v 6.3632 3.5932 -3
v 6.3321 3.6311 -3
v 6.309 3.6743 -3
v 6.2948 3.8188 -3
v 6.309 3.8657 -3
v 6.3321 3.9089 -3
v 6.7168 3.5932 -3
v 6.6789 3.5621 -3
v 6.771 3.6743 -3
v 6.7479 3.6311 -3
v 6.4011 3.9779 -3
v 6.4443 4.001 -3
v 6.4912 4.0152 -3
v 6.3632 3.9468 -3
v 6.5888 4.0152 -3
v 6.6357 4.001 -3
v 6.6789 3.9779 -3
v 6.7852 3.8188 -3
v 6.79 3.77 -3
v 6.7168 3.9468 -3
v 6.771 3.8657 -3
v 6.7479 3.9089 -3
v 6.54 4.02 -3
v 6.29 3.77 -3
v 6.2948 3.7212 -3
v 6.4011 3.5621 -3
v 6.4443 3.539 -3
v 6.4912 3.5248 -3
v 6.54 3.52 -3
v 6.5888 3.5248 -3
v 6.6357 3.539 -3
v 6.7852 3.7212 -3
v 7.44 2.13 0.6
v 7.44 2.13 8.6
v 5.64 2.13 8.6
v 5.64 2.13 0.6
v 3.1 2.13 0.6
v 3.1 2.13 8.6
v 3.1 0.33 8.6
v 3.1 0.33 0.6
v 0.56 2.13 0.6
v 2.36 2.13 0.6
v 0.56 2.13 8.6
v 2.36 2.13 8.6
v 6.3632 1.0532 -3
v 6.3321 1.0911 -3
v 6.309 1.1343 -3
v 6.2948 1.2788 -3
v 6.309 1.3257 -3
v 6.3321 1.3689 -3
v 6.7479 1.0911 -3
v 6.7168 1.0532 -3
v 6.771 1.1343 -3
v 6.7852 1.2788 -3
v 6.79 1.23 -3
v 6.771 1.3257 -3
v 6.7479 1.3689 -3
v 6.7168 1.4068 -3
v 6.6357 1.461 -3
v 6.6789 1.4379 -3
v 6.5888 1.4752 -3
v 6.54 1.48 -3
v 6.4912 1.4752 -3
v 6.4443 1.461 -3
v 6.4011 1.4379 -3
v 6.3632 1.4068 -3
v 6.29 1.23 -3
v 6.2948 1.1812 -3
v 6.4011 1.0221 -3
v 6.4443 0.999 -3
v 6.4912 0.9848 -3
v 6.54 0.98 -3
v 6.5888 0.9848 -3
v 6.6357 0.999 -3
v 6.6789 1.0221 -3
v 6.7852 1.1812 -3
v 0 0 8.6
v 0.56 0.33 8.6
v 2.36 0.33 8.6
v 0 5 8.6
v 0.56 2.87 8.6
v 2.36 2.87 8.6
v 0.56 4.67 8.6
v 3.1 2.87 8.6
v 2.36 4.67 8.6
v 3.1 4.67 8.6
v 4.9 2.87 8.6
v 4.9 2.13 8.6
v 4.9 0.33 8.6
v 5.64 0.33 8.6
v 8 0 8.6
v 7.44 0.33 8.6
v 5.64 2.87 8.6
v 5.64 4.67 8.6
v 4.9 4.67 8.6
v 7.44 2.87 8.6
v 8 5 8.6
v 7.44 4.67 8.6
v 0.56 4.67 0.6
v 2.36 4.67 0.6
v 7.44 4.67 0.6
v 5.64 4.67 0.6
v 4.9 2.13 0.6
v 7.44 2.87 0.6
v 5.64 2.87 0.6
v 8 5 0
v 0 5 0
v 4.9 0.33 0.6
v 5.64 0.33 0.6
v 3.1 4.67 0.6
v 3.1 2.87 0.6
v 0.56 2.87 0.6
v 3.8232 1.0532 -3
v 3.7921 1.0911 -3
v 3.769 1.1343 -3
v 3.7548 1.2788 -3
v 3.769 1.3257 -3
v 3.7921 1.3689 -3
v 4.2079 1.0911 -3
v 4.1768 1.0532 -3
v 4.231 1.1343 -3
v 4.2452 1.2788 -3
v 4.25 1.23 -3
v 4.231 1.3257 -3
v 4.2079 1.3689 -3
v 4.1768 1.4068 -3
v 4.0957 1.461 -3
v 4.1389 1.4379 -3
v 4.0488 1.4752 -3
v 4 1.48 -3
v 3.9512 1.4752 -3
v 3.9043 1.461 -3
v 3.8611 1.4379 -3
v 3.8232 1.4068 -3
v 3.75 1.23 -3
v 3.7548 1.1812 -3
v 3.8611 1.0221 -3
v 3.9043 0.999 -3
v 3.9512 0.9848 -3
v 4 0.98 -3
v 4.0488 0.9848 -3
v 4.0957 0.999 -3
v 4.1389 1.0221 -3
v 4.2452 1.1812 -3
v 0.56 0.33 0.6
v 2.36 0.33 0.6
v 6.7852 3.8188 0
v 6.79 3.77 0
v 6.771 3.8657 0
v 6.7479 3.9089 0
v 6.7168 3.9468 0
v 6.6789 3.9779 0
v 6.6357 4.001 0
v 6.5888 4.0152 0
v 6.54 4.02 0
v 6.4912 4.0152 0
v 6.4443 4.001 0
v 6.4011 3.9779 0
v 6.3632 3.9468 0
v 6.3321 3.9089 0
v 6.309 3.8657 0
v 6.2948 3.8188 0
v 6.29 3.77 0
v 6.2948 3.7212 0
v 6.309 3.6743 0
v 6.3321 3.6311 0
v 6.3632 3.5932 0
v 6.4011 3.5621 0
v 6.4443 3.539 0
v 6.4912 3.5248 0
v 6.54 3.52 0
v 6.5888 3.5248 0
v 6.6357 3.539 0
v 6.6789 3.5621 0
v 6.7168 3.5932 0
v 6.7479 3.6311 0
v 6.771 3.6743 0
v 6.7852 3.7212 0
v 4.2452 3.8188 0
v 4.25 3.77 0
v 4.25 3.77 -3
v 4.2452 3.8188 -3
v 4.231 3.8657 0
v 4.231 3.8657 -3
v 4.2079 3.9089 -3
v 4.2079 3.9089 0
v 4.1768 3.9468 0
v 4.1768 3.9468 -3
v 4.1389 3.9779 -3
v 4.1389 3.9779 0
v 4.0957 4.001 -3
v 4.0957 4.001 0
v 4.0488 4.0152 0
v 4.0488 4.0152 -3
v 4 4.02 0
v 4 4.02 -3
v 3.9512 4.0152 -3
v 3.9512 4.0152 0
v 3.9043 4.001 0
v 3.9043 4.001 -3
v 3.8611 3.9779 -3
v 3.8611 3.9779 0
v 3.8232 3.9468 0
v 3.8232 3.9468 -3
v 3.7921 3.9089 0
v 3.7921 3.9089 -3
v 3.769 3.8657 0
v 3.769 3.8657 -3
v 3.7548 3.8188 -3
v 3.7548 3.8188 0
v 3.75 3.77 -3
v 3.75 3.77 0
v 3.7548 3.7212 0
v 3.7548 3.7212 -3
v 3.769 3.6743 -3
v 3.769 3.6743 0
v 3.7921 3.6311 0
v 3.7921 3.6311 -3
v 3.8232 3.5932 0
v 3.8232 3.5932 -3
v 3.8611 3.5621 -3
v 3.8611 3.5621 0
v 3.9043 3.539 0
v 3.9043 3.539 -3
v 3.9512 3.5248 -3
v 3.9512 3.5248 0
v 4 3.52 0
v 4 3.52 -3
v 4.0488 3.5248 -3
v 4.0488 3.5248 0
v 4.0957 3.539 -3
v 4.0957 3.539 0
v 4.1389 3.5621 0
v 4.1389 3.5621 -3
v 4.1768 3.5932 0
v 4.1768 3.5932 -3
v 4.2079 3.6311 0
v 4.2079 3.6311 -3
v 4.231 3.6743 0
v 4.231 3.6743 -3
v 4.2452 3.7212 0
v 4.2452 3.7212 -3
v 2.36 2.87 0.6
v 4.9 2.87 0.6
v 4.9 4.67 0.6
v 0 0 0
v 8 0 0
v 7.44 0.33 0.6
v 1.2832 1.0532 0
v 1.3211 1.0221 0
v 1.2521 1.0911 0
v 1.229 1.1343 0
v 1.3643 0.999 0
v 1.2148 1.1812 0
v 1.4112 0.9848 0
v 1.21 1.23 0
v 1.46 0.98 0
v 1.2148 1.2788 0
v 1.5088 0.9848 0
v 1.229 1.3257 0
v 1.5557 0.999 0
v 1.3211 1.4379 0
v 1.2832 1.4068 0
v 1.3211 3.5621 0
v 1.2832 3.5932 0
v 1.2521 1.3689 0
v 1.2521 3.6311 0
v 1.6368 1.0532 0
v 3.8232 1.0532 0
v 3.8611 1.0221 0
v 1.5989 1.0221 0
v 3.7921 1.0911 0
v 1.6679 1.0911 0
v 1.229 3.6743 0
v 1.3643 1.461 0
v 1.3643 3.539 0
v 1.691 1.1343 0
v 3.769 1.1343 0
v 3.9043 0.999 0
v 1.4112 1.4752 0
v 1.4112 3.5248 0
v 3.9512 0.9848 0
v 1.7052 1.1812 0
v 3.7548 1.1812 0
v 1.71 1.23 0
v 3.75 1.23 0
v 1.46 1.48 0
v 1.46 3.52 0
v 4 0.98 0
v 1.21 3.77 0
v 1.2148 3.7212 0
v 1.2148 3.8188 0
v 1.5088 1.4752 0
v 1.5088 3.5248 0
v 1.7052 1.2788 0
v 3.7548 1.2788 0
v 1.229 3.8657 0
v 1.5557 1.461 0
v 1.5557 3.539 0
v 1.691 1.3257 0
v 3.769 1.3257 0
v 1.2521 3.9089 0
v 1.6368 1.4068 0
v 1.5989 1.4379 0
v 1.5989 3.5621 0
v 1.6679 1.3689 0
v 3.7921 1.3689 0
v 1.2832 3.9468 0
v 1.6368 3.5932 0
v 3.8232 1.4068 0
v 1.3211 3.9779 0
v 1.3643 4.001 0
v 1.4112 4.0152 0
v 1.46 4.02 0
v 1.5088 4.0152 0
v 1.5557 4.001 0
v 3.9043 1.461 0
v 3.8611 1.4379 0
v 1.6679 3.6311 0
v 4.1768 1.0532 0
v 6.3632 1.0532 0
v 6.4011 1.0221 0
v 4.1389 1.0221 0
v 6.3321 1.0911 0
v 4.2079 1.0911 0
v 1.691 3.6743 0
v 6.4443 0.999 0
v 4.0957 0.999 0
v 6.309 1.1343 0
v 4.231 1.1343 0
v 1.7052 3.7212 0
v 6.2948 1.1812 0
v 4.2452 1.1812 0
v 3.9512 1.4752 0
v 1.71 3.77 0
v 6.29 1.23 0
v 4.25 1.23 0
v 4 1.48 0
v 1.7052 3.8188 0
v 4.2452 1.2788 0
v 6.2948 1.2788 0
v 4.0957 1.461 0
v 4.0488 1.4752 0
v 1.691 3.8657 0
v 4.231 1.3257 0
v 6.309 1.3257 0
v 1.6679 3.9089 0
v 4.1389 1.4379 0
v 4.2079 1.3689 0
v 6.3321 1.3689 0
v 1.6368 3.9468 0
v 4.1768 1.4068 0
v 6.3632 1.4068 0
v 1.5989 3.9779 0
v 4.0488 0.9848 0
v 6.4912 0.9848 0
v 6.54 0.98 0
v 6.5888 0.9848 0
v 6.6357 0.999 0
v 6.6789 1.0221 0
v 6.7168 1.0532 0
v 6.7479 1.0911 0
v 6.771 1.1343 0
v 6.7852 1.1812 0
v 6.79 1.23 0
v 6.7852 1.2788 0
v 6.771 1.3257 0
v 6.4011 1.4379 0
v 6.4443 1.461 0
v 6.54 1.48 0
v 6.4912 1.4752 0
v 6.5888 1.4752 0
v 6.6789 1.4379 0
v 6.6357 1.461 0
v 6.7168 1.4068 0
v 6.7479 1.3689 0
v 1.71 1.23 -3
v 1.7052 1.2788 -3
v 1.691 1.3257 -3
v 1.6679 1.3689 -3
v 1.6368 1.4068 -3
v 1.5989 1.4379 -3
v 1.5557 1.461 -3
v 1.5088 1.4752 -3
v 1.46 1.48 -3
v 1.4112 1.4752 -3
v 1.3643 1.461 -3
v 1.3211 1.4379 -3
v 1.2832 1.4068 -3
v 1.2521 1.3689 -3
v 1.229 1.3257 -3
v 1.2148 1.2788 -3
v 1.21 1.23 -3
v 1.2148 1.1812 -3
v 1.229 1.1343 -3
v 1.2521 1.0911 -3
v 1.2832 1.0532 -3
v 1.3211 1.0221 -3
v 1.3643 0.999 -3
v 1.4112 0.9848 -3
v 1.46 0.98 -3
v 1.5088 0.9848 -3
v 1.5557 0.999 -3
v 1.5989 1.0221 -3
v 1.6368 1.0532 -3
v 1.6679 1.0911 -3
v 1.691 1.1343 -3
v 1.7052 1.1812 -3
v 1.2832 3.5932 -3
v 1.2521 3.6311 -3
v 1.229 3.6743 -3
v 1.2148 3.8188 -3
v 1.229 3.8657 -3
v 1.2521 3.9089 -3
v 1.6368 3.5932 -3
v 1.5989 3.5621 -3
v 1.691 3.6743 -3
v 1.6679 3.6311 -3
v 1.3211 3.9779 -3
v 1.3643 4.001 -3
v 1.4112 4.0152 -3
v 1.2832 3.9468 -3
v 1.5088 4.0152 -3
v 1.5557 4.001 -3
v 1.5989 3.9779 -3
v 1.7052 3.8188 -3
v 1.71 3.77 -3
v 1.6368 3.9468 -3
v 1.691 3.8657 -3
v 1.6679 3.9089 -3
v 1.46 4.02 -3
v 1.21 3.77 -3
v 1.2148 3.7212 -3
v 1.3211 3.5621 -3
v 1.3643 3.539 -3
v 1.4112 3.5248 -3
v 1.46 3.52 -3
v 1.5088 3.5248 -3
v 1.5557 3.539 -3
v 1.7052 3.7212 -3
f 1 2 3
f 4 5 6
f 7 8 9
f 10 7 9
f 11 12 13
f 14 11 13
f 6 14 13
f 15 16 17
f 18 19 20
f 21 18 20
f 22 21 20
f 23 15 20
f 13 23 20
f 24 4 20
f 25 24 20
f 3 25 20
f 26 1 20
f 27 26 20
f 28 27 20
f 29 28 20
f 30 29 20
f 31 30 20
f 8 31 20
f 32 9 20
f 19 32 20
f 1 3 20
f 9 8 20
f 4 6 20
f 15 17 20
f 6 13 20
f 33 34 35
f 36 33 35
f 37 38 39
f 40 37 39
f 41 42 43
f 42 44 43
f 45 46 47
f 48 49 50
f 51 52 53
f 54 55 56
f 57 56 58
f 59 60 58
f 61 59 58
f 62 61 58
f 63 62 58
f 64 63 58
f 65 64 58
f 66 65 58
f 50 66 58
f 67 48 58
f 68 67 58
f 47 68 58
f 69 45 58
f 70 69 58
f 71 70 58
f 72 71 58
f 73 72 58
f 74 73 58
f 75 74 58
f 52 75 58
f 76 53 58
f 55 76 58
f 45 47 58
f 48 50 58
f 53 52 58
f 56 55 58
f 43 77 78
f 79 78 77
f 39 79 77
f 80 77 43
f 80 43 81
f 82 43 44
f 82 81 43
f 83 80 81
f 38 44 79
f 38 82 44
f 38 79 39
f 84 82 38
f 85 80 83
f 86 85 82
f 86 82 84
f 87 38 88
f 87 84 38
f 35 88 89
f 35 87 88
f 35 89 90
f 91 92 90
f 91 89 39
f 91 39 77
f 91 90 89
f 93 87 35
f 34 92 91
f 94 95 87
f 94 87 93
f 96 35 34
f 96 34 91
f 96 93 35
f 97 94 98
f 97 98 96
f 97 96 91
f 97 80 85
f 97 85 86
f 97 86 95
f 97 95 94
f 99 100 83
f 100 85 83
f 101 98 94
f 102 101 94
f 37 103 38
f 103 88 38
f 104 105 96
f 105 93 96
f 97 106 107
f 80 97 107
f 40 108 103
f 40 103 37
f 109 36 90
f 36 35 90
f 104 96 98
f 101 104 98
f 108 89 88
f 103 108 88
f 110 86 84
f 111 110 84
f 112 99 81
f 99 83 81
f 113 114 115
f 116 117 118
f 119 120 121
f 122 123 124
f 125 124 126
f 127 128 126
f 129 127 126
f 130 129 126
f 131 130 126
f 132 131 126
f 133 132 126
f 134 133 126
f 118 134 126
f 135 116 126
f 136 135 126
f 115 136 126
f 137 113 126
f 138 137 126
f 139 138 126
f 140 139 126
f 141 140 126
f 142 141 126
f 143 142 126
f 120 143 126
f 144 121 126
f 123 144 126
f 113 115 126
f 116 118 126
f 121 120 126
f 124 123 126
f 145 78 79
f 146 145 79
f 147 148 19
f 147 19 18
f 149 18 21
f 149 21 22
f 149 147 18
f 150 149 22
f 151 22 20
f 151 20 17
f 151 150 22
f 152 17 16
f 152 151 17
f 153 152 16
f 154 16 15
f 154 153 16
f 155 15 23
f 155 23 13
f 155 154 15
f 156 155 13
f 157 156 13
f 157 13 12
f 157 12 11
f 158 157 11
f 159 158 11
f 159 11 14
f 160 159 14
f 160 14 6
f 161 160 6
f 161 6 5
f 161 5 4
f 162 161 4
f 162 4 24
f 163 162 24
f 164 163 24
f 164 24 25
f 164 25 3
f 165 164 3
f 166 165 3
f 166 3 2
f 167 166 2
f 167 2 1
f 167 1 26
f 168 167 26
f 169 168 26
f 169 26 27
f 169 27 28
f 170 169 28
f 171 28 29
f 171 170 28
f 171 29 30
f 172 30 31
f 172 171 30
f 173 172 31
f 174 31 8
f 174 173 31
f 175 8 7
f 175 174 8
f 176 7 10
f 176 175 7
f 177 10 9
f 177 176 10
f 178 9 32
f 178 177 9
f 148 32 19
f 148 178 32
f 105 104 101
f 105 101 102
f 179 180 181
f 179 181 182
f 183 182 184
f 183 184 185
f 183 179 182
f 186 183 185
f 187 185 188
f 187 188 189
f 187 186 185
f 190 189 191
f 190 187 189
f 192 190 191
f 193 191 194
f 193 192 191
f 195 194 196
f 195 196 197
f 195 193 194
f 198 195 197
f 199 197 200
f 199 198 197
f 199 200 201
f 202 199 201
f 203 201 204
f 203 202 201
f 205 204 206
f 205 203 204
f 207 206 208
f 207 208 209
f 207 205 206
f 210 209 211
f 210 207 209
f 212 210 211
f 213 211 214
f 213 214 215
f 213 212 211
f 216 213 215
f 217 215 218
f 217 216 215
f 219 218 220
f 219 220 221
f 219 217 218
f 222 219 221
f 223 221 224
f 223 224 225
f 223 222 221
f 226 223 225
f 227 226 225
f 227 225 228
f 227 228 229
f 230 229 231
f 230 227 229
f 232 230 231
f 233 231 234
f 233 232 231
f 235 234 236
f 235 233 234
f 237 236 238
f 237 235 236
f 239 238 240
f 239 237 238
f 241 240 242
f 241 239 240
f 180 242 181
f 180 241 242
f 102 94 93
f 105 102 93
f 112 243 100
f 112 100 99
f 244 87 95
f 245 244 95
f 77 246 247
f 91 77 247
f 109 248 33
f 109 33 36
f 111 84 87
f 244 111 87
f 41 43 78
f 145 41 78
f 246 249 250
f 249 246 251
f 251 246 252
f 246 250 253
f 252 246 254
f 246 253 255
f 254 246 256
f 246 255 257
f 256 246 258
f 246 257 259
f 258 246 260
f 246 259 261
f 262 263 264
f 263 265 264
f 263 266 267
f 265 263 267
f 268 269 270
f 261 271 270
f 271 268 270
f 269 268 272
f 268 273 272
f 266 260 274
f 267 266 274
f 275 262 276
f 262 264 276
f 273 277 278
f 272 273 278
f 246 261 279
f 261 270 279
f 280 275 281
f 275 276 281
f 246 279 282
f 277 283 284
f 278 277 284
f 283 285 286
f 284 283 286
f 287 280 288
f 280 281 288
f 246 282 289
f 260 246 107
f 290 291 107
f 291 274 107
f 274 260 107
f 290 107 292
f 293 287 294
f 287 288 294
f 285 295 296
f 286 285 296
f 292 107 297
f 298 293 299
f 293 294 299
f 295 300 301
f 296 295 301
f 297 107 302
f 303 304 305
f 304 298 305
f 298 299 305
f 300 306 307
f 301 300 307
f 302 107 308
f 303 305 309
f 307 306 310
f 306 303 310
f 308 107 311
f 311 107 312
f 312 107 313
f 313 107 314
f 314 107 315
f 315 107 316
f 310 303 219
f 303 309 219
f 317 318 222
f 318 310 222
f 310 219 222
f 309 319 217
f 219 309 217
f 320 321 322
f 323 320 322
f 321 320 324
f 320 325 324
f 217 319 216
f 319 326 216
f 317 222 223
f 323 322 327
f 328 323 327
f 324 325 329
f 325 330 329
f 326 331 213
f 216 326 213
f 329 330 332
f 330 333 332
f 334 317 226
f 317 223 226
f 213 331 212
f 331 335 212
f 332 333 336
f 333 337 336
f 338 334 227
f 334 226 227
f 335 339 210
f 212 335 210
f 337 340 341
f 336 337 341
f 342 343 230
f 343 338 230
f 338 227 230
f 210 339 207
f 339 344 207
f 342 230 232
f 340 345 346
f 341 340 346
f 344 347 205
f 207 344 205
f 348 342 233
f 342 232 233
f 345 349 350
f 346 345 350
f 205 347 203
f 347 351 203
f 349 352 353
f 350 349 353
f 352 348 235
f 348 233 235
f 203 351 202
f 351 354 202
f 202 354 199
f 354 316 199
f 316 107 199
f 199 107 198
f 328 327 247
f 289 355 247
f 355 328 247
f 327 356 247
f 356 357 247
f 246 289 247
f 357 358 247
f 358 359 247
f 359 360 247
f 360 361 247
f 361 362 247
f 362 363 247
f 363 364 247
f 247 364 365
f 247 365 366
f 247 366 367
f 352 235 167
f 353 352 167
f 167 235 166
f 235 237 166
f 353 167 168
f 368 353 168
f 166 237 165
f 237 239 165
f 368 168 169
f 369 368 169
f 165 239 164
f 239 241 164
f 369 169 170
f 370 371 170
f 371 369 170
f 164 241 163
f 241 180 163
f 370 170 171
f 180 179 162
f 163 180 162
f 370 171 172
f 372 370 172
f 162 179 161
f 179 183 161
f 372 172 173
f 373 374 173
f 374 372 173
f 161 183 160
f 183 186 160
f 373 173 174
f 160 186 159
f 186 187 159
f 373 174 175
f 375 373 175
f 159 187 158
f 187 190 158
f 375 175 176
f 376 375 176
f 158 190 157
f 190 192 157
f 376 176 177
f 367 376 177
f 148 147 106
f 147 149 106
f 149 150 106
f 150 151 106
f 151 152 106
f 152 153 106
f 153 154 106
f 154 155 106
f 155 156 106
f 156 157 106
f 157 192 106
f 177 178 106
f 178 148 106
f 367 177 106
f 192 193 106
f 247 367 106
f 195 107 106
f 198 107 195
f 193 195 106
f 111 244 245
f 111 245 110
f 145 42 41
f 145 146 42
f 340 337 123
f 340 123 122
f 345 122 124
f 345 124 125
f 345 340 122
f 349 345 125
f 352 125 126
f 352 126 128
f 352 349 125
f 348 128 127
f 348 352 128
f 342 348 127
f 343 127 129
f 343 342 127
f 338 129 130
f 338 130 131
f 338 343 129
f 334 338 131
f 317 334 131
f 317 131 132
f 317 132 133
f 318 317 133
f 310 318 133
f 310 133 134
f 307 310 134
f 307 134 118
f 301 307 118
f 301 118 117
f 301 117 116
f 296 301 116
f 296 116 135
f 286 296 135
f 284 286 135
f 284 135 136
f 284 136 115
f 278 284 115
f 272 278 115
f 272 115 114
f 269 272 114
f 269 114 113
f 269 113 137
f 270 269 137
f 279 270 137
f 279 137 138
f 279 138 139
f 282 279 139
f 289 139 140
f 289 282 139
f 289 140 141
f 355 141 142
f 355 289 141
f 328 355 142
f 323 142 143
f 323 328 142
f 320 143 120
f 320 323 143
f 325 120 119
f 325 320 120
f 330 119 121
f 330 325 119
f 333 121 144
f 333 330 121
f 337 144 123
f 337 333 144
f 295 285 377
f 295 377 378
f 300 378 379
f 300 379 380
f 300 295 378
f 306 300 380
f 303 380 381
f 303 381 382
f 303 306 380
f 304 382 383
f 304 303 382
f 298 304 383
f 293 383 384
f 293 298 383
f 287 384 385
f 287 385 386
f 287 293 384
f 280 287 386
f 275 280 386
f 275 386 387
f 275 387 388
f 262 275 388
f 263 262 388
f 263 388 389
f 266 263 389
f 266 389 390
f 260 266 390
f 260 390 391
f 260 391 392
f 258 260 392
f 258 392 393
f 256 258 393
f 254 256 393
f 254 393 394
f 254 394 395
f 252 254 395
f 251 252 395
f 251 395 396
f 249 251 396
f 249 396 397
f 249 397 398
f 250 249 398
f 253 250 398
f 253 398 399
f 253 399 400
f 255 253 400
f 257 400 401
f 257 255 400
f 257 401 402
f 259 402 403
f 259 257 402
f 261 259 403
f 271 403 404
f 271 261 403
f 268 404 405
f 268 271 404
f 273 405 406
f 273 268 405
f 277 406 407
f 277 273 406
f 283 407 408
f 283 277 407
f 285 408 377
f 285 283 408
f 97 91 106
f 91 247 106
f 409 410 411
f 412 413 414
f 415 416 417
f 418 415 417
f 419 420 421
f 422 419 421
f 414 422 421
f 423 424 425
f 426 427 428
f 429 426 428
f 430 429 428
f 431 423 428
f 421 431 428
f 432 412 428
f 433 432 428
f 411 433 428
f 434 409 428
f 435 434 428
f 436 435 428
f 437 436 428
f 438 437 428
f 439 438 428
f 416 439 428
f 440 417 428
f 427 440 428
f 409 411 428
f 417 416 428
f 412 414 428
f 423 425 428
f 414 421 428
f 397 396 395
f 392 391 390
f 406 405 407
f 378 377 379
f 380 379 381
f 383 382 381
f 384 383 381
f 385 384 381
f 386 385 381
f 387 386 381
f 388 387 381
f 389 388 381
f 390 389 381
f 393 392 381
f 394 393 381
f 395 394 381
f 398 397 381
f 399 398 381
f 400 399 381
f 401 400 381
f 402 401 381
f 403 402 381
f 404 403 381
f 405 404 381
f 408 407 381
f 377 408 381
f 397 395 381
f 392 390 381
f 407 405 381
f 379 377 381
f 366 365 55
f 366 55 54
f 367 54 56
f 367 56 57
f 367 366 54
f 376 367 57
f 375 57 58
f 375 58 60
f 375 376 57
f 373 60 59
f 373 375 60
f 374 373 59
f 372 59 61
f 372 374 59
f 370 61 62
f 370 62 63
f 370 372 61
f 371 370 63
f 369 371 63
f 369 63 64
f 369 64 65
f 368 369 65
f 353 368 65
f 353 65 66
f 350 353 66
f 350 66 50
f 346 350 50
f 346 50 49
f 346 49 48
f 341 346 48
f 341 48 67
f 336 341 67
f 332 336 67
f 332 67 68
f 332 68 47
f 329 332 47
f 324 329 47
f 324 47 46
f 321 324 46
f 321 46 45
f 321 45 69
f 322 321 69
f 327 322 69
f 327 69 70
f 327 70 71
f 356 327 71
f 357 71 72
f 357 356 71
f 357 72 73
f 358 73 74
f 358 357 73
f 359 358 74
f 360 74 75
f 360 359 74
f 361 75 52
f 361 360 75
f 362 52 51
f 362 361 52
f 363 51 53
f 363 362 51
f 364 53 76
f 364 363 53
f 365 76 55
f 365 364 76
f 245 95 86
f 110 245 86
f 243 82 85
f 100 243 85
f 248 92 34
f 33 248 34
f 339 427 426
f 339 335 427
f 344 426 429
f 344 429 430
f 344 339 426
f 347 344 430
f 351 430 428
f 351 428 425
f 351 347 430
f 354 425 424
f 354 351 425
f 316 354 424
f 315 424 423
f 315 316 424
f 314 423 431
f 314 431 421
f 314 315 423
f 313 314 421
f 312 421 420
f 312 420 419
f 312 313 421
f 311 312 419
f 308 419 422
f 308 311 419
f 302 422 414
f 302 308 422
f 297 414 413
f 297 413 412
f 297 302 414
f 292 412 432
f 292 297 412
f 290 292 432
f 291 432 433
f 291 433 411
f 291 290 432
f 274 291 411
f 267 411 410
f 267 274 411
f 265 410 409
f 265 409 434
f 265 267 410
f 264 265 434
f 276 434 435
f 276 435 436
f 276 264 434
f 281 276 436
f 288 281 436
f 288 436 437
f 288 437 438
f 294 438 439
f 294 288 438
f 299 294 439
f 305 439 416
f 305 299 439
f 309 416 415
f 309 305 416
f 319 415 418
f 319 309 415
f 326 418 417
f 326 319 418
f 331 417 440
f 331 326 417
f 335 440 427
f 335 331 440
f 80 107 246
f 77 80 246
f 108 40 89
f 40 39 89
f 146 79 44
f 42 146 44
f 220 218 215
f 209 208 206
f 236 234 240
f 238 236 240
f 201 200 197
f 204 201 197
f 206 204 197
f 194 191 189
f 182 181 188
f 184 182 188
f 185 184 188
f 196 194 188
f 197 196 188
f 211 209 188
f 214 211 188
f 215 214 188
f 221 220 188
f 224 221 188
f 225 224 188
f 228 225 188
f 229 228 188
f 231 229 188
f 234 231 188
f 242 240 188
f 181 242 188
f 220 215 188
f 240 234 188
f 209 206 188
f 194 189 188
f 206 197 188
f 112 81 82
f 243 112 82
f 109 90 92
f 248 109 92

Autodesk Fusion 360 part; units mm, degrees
sketch "スケッチ1" plane through (0, 0, 0) normal (0, 0, 1) x (1, 0, 0)
  line L0 (0, 0) -> (8, 0)
  line L1 (8, 0) -> (8, 5)
  line L2 (8, 5) -> (0, 5)
  line L3 (0, 5) -> (0, 0)
  circle A0 centre (1.46, 1.23) radius 0.25
  dimension "d1" = 8
  dimension "d2" = 5
  dimension "d15" = 0.5
  dimension "d16" = 1.23
  dimension "d17" = 1.46
extrude "押し出し1" add sketch "スケッチ1" along normal blind 8.6 contours L0 L1 L2 L3 | A0
sketch "スケッチ2" plane through (0, 0, 8.6) normal (0, 0, 1) x (-1, 0, 0)
  line L0 (0, -5) -> (0, 0)
  line L1 (0, 0) -> (-8, 0)
  line L2 (-8, 0) -> (-8, -5)
  line L3 (-8, -5) -> (0, -5)
  line L4 (-0.56, -0.33) -> (-2.36, -0.33)
  line L5 (-2.36, -0.33) -> (-2.36, -2.13)
  line L6 (-2.36, -2.13) -> (-0.56, -2.13)
  line L7 (-0.56, -2.13) -> (-0.56, -0.33)
  dimension "d5" = 1.8
  dimension "d6" = 1.8
  dimension "d7" = 0.33
  dimension "d8" = 0.56
extrude "押し出し2" cut sketch "スケッチ2" against normal blind 8 contours L4 L5 L6 L7
pattern_linear "R パターン1" count 3 spacing 2.54 along (1, 0, 0) count 2 spacing 2.54 along (0, 1, 0) of "押し出し2"
extrude "押し出し3" add sketch "スケッチ1" against normal blind 3 contours A0
pattern_linear "R パターン2" count 3 spacing 2.54 along (1, 0, 0) count 2 spacing 2.54 along (0, 1, 0) of "押し出し3"
